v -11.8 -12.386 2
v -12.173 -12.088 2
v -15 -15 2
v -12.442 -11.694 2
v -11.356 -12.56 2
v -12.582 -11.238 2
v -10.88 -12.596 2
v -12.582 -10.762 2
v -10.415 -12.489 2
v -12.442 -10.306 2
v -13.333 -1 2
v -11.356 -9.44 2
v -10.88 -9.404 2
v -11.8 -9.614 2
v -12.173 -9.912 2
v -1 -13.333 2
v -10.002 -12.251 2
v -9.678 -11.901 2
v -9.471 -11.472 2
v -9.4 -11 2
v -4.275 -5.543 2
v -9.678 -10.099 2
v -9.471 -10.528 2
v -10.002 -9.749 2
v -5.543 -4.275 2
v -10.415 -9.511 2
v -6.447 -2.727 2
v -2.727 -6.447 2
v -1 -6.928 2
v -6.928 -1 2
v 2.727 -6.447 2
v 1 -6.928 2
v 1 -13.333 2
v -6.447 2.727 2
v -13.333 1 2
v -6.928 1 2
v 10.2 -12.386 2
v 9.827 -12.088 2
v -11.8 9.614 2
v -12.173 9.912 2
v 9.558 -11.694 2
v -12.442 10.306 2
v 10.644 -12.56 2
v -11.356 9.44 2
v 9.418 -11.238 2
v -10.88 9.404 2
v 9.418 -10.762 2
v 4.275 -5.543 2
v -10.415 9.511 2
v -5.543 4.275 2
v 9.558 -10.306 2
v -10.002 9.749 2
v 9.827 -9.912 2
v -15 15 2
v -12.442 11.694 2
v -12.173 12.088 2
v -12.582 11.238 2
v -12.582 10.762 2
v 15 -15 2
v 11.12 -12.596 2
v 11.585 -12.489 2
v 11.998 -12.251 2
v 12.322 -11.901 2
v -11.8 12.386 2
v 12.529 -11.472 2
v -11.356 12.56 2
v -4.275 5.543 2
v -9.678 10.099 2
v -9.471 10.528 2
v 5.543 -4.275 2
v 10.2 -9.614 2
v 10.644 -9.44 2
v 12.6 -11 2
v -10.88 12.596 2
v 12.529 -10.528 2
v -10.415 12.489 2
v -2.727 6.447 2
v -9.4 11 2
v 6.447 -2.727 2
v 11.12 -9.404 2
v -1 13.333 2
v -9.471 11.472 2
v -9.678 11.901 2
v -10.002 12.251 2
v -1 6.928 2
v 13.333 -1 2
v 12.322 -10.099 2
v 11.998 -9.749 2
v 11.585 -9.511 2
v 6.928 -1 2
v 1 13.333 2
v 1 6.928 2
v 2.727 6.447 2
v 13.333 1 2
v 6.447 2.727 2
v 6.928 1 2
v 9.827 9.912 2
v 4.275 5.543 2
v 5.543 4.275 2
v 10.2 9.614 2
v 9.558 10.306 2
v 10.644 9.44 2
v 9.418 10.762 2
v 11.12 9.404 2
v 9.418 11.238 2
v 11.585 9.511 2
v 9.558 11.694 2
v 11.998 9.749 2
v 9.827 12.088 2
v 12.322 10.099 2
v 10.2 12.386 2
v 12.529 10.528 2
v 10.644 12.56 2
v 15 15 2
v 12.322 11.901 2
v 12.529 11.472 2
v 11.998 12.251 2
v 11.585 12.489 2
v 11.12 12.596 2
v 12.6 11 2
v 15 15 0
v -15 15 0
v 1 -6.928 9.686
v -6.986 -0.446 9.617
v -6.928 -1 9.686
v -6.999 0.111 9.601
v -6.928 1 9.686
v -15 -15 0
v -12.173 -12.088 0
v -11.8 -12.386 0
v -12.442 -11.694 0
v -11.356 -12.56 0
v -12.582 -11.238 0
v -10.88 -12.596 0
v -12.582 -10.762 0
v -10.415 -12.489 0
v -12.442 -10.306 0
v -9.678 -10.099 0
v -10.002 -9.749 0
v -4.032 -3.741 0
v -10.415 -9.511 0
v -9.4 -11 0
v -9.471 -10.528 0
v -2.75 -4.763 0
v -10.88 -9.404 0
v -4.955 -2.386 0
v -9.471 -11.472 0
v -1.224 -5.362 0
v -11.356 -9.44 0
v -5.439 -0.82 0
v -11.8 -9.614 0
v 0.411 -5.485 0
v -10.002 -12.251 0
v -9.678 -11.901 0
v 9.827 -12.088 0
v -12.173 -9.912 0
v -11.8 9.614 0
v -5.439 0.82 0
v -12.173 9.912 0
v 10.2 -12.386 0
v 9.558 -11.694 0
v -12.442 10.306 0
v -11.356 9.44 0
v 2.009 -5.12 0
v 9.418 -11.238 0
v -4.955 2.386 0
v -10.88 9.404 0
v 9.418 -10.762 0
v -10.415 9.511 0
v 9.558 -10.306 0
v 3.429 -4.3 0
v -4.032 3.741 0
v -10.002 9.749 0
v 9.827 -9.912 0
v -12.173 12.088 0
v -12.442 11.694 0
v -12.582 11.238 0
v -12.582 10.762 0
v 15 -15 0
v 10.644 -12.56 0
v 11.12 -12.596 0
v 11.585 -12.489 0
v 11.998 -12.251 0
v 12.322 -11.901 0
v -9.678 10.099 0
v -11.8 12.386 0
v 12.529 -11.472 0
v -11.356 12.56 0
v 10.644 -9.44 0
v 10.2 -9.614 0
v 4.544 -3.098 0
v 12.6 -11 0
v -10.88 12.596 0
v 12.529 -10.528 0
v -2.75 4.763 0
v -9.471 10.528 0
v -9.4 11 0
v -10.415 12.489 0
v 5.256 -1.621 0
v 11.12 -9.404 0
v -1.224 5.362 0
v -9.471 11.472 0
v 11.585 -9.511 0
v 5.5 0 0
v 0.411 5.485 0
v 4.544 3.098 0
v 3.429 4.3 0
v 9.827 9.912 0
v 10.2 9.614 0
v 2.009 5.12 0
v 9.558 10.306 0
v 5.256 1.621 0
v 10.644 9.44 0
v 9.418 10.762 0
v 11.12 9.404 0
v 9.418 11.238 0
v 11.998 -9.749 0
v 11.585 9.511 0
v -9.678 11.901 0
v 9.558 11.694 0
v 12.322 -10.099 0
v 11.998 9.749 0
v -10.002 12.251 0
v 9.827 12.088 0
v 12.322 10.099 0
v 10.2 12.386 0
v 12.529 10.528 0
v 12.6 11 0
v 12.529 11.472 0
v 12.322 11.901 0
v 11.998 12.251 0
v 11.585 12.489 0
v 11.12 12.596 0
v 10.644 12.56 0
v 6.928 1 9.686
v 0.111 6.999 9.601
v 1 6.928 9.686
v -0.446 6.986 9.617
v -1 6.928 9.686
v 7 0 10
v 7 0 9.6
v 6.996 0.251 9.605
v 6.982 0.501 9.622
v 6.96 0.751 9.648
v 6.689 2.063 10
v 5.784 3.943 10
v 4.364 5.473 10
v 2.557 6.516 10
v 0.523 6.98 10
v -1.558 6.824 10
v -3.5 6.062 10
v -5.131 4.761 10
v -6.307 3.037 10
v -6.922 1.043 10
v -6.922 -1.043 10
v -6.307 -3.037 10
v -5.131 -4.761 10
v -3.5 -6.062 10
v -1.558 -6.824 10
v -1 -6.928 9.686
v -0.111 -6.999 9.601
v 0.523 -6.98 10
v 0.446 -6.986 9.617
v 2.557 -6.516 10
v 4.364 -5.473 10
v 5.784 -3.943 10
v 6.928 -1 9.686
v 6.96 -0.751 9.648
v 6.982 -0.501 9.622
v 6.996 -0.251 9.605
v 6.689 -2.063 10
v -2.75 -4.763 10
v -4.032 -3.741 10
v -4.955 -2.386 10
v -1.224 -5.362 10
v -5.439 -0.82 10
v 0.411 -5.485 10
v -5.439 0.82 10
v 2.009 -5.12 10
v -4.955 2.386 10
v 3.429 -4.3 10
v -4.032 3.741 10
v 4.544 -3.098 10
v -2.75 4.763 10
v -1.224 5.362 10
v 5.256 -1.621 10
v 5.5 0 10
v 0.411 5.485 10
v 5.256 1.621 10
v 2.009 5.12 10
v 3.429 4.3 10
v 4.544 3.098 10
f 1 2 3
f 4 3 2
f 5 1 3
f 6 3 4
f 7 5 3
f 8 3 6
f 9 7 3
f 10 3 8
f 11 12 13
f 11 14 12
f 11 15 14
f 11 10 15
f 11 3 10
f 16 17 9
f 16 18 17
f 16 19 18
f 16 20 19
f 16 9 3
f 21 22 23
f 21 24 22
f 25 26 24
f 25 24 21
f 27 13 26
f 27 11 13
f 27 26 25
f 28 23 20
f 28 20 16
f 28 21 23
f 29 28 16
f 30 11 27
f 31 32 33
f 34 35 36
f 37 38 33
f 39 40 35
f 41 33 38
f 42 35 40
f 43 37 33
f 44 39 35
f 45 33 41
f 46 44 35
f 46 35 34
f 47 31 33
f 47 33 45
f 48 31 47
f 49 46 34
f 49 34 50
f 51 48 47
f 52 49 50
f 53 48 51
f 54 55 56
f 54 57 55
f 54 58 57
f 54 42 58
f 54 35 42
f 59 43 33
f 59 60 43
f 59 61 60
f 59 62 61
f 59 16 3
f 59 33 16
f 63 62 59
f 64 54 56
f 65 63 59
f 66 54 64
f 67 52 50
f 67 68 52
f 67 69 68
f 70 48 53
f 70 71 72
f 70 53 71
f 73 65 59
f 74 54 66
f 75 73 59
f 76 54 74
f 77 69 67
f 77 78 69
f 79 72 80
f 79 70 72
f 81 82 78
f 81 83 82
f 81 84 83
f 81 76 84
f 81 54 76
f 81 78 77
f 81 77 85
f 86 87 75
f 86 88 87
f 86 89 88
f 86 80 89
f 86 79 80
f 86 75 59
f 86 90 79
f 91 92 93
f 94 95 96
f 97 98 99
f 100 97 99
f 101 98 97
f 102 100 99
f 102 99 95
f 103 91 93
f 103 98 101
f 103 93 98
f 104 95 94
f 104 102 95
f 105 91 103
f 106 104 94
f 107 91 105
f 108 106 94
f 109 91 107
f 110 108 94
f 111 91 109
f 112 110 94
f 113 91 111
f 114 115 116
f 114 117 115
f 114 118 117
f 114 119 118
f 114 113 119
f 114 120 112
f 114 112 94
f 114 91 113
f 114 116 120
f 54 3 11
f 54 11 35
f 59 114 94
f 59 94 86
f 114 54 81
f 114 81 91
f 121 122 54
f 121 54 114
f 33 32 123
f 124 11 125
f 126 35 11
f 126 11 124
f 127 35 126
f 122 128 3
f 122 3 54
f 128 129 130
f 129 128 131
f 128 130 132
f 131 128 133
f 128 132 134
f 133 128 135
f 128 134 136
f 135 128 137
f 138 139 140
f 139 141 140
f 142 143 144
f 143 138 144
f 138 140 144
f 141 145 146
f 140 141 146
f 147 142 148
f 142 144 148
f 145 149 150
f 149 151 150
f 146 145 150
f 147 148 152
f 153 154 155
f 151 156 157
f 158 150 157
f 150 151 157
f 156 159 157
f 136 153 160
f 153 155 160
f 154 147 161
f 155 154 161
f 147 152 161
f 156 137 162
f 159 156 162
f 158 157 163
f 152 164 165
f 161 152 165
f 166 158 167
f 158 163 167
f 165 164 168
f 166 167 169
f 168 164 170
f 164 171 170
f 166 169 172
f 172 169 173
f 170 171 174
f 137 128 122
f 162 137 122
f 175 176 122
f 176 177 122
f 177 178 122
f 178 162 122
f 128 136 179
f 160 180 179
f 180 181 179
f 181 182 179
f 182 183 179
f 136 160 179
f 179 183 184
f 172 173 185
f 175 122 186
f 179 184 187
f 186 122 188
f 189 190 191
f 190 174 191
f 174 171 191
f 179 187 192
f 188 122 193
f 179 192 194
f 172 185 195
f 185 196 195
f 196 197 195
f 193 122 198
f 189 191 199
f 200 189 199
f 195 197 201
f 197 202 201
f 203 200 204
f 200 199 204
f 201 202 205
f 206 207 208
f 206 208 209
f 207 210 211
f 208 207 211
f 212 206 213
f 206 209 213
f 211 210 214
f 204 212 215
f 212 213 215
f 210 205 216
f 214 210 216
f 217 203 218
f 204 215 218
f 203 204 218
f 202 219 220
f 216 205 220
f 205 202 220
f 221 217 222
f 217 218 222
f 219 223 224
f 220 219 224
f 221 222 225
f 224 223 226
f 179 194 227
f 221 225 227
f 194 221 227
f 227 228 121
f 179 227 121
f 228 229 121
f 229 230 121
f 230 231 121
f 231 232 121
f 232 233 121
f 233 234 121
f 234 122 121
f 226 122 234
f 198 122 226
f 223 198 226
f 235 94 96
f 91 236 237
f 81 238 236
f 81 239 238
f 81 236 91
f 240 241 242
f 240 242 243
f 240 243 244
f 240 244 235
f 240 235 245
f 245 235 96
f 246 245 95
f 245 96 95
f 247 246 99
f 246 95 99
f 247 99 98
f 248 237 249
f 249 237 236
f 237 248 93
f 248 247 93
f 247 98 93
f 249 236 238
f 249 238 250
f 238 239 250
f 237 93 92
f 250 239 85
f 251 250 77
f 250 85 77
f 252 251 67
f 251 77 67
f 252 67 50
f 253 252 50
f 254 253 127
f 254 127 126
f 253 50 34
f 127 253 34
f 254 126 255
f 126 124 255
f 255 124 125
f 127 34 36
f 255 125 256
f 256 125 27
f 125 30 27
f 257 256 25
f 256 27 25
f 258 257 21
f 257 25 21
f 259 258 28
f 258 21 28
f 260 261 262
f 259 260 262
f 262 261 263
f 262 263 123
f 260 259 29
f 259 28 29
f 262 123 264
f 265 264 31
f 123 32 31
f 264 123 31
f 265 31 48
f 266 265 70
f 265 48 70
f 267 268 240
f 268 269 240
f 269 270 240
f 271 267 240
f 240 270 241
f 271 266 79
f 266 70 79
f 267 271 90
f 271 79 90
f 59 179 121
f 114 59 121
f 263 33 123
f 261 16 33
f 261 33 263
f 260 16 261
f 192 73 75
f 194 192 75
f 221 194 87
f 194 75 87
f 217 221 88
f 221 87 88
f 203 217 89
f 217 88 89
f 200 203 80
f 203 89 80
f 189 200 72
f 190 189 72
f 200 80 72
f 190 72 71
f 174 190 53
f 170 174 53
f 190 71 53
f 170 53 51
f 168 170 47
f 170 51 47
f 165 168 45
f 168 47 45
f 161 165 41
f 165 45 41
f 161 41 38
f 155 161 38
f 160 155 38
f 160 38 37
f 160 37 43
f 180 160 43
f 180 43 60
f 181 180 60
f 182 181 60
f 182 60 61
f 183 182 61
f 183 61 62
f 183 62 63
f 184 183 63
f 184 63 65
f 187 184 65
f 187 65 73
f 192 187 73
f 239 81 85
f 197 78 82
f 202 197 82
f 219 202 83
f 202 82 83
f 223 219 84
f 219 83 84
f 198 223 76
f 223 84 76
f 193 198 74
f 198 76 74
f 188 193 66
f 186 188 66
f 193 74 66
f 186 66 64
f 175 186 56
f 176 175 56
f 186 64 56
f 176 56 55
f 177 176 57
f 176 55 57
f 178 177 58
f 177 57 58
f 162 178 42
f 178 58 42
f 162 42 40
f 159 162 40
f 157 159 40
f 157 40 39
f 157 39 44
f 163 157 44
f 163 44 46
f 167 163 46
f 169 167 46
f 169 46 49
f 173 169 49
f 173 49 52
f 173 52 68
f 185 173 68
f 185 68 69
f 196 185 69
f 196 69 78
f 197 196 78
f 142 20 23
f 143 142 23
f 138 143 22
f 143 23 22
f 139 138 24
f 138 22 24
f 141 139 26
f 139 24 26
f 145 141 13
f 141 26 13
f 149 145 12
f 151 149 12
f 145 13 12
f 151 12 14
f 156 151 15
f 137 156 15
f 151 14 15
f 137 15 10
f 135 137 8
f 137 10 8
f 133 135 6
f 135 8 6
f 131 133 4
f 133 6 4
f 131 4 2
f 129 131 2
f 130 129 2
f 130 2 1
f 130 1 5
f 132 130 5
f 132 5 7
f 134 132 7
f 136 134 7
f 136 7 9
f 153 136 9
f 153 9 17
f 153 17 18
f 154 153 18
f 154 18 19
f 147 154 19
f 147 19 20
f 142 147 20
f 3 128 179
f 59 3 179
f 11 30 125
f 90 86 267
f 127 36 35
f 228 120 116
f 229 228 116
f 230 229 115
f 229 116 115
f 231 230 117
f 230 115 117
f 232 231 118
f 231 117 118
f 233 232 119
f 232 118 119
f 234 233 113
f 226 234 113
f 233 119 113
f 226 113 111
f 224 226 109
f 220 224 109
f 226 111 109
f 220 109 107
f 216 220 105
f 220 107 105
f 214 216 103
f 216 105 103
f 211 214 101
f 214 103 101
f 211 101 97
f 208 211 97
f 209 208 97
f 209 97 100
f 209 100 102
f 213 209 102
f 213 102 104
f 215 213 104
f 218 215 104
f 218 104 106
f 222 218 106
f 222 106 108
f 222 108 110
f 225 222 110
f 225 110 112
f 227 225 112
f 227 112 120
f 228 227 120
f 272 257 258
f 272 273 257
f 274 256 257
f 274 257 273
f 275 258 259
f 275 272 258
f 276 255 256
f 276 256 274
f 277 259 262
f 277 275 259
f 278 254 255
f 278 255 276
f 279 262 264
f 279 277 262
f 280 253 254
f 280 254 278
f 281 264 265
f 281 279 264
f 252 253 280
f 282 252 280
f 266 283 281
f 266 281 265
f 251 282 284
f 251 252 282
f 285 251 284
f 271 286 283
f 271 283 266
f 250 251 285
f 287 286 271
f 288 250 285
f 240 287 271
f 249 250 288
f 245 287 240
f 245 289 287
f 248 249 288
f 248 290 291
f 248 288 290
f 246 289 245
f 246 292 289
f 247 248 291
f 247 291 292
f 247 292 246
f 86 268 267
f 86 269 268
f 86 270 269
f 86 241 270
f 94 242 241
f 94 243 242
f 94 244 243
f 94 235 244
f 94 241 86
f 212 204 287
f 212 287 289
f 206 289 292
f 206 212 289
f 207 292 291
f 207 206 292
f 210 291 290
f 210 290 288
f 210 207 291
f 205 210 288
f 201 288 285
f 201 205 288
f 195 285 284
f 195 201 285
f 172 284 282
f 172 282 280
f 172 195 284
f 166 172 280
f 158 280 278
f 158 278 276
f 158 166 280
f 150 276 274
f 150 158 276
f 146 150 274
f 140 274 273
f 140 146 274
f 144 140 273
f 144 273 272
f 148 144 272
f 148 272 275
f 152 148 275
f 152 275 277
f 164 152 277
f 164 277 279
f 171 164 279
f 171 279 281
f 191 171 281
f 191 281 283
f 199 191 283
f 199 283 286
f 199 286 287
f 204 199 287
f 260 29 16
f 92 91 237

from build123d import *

# Parameters (mm, degrees)
CYLINDER001_R     = 5.5
CYLINDER001_DEPTH = 10
BOX001_W          = 60
BOX001_H          = 60
BOX001_DEPTH      = 60
PAD_DEPTH         = 2
PAD001_DEPTH      = 2
CYLINDER_R        = 7
CYLINDER_DEPTH    = 10
SKETCH_R          = 5.5
POCKET_DEPTH      = 10.001
BOX_W             = 30
BOX_H             = 30
BOX_DEPTH         = 2
SKETCH001_R       = 1.6
POCKET001_DEPTH   = 2.001


with BuildPart() as cylinder001:
    # Cylinder001 → Cylinder001 (new body)
    with BuildSketch(Plane.XY):
        Circle(CYLINDER001_R)
    extrude(amount=CYLINDER001_DEPTH)


with BuildPart() as cube001:
    # Box001 → Box001 (new body)
    with BuildSketch(Plane(origin=(-30, -30, 10), x_dir=(1, 0, 0), z_dir=(0, 0, 1))):
        with Locations((30, 30)):
            Rectangle(BOX001_W, BOX001_H)
    extrude(amount=BOX001_DEPTH)


with BuildPart() as pad:
    # Sketch002 → Pad (new body)
    with BuildSketch(Plane.XZ.offset(-1)):
        Polygon((-15, 0), (0, 18), (15, 0), align=None)
    extrude(amount=PAD_DEPTH)


with BuildPart() as pad001:
    # Sketch003 → Pad001 (new body)
    with BuildSketch(Plane.YZ.offset(-1)):
        Polygon((-15, 0), (0, 18), (15, 0), align=None)
    extrude(amount=PAD001_DEPTH)


with BuildPart() as pocket:
    # Cylinder → Cylinder (new body)
    with BuildSketch(Plane.XY):
        Circle(CYLINDER_R)
    extrude(amount=CYLINDER_DEPTH)

    # Sketch → Pocket (cut, through all)
    with BuildSketch(Plane.XY.offset(10)):
        Circle(SKETCH_R)
    extrude(amount=-POCKET_DEPTH, mode=Mode.SUBTRACT)


with BuildPart() as cut001:
    # Box → Box (new body)
    with BuildSketch(Plane(origin=(-15, -15, 0), x_dir=(1, 0, 0), z_dir=(0, 0, 1))):
        with Locations((15, 15)):
            Rectangle(BOX_W, BOX_H)
    extrude(amount=BOX_DEPTH)

    # Sketch001 → Pocket001 (cut, through all)
    with BuildSketch(Plane(origin=(-15, -15, 2), x_dir=(1, 0, 0), z_dir=(0, 0, 1))):
        with Locations((4, 4)):
            Circle(SKETCH001_R)
        with Locations((26, 26)):
            Circle(SKETCH001_R)
        with Locations((26, 4)):
            Circle(SKETCH001_R)
        with Locations((4, 26)):
            Circle(SKETCH001_R)
    extrude(amount=-POCKET001_DEPTH, mode=Mode.SUBTRACT)

    # Fusion: union Pad, Pad001, Pocket
    add(pad.part)
    add(pad001.part)
    add(pocket.part)

    # Cut: cut Cube001
    add(cube001.part, mode=Mode.SUBTRACT)

    # Cut001: cut Cylinder001
    add(cylinder001.part, mode=Mode.SUBTRACT)


solid = cut001.part
